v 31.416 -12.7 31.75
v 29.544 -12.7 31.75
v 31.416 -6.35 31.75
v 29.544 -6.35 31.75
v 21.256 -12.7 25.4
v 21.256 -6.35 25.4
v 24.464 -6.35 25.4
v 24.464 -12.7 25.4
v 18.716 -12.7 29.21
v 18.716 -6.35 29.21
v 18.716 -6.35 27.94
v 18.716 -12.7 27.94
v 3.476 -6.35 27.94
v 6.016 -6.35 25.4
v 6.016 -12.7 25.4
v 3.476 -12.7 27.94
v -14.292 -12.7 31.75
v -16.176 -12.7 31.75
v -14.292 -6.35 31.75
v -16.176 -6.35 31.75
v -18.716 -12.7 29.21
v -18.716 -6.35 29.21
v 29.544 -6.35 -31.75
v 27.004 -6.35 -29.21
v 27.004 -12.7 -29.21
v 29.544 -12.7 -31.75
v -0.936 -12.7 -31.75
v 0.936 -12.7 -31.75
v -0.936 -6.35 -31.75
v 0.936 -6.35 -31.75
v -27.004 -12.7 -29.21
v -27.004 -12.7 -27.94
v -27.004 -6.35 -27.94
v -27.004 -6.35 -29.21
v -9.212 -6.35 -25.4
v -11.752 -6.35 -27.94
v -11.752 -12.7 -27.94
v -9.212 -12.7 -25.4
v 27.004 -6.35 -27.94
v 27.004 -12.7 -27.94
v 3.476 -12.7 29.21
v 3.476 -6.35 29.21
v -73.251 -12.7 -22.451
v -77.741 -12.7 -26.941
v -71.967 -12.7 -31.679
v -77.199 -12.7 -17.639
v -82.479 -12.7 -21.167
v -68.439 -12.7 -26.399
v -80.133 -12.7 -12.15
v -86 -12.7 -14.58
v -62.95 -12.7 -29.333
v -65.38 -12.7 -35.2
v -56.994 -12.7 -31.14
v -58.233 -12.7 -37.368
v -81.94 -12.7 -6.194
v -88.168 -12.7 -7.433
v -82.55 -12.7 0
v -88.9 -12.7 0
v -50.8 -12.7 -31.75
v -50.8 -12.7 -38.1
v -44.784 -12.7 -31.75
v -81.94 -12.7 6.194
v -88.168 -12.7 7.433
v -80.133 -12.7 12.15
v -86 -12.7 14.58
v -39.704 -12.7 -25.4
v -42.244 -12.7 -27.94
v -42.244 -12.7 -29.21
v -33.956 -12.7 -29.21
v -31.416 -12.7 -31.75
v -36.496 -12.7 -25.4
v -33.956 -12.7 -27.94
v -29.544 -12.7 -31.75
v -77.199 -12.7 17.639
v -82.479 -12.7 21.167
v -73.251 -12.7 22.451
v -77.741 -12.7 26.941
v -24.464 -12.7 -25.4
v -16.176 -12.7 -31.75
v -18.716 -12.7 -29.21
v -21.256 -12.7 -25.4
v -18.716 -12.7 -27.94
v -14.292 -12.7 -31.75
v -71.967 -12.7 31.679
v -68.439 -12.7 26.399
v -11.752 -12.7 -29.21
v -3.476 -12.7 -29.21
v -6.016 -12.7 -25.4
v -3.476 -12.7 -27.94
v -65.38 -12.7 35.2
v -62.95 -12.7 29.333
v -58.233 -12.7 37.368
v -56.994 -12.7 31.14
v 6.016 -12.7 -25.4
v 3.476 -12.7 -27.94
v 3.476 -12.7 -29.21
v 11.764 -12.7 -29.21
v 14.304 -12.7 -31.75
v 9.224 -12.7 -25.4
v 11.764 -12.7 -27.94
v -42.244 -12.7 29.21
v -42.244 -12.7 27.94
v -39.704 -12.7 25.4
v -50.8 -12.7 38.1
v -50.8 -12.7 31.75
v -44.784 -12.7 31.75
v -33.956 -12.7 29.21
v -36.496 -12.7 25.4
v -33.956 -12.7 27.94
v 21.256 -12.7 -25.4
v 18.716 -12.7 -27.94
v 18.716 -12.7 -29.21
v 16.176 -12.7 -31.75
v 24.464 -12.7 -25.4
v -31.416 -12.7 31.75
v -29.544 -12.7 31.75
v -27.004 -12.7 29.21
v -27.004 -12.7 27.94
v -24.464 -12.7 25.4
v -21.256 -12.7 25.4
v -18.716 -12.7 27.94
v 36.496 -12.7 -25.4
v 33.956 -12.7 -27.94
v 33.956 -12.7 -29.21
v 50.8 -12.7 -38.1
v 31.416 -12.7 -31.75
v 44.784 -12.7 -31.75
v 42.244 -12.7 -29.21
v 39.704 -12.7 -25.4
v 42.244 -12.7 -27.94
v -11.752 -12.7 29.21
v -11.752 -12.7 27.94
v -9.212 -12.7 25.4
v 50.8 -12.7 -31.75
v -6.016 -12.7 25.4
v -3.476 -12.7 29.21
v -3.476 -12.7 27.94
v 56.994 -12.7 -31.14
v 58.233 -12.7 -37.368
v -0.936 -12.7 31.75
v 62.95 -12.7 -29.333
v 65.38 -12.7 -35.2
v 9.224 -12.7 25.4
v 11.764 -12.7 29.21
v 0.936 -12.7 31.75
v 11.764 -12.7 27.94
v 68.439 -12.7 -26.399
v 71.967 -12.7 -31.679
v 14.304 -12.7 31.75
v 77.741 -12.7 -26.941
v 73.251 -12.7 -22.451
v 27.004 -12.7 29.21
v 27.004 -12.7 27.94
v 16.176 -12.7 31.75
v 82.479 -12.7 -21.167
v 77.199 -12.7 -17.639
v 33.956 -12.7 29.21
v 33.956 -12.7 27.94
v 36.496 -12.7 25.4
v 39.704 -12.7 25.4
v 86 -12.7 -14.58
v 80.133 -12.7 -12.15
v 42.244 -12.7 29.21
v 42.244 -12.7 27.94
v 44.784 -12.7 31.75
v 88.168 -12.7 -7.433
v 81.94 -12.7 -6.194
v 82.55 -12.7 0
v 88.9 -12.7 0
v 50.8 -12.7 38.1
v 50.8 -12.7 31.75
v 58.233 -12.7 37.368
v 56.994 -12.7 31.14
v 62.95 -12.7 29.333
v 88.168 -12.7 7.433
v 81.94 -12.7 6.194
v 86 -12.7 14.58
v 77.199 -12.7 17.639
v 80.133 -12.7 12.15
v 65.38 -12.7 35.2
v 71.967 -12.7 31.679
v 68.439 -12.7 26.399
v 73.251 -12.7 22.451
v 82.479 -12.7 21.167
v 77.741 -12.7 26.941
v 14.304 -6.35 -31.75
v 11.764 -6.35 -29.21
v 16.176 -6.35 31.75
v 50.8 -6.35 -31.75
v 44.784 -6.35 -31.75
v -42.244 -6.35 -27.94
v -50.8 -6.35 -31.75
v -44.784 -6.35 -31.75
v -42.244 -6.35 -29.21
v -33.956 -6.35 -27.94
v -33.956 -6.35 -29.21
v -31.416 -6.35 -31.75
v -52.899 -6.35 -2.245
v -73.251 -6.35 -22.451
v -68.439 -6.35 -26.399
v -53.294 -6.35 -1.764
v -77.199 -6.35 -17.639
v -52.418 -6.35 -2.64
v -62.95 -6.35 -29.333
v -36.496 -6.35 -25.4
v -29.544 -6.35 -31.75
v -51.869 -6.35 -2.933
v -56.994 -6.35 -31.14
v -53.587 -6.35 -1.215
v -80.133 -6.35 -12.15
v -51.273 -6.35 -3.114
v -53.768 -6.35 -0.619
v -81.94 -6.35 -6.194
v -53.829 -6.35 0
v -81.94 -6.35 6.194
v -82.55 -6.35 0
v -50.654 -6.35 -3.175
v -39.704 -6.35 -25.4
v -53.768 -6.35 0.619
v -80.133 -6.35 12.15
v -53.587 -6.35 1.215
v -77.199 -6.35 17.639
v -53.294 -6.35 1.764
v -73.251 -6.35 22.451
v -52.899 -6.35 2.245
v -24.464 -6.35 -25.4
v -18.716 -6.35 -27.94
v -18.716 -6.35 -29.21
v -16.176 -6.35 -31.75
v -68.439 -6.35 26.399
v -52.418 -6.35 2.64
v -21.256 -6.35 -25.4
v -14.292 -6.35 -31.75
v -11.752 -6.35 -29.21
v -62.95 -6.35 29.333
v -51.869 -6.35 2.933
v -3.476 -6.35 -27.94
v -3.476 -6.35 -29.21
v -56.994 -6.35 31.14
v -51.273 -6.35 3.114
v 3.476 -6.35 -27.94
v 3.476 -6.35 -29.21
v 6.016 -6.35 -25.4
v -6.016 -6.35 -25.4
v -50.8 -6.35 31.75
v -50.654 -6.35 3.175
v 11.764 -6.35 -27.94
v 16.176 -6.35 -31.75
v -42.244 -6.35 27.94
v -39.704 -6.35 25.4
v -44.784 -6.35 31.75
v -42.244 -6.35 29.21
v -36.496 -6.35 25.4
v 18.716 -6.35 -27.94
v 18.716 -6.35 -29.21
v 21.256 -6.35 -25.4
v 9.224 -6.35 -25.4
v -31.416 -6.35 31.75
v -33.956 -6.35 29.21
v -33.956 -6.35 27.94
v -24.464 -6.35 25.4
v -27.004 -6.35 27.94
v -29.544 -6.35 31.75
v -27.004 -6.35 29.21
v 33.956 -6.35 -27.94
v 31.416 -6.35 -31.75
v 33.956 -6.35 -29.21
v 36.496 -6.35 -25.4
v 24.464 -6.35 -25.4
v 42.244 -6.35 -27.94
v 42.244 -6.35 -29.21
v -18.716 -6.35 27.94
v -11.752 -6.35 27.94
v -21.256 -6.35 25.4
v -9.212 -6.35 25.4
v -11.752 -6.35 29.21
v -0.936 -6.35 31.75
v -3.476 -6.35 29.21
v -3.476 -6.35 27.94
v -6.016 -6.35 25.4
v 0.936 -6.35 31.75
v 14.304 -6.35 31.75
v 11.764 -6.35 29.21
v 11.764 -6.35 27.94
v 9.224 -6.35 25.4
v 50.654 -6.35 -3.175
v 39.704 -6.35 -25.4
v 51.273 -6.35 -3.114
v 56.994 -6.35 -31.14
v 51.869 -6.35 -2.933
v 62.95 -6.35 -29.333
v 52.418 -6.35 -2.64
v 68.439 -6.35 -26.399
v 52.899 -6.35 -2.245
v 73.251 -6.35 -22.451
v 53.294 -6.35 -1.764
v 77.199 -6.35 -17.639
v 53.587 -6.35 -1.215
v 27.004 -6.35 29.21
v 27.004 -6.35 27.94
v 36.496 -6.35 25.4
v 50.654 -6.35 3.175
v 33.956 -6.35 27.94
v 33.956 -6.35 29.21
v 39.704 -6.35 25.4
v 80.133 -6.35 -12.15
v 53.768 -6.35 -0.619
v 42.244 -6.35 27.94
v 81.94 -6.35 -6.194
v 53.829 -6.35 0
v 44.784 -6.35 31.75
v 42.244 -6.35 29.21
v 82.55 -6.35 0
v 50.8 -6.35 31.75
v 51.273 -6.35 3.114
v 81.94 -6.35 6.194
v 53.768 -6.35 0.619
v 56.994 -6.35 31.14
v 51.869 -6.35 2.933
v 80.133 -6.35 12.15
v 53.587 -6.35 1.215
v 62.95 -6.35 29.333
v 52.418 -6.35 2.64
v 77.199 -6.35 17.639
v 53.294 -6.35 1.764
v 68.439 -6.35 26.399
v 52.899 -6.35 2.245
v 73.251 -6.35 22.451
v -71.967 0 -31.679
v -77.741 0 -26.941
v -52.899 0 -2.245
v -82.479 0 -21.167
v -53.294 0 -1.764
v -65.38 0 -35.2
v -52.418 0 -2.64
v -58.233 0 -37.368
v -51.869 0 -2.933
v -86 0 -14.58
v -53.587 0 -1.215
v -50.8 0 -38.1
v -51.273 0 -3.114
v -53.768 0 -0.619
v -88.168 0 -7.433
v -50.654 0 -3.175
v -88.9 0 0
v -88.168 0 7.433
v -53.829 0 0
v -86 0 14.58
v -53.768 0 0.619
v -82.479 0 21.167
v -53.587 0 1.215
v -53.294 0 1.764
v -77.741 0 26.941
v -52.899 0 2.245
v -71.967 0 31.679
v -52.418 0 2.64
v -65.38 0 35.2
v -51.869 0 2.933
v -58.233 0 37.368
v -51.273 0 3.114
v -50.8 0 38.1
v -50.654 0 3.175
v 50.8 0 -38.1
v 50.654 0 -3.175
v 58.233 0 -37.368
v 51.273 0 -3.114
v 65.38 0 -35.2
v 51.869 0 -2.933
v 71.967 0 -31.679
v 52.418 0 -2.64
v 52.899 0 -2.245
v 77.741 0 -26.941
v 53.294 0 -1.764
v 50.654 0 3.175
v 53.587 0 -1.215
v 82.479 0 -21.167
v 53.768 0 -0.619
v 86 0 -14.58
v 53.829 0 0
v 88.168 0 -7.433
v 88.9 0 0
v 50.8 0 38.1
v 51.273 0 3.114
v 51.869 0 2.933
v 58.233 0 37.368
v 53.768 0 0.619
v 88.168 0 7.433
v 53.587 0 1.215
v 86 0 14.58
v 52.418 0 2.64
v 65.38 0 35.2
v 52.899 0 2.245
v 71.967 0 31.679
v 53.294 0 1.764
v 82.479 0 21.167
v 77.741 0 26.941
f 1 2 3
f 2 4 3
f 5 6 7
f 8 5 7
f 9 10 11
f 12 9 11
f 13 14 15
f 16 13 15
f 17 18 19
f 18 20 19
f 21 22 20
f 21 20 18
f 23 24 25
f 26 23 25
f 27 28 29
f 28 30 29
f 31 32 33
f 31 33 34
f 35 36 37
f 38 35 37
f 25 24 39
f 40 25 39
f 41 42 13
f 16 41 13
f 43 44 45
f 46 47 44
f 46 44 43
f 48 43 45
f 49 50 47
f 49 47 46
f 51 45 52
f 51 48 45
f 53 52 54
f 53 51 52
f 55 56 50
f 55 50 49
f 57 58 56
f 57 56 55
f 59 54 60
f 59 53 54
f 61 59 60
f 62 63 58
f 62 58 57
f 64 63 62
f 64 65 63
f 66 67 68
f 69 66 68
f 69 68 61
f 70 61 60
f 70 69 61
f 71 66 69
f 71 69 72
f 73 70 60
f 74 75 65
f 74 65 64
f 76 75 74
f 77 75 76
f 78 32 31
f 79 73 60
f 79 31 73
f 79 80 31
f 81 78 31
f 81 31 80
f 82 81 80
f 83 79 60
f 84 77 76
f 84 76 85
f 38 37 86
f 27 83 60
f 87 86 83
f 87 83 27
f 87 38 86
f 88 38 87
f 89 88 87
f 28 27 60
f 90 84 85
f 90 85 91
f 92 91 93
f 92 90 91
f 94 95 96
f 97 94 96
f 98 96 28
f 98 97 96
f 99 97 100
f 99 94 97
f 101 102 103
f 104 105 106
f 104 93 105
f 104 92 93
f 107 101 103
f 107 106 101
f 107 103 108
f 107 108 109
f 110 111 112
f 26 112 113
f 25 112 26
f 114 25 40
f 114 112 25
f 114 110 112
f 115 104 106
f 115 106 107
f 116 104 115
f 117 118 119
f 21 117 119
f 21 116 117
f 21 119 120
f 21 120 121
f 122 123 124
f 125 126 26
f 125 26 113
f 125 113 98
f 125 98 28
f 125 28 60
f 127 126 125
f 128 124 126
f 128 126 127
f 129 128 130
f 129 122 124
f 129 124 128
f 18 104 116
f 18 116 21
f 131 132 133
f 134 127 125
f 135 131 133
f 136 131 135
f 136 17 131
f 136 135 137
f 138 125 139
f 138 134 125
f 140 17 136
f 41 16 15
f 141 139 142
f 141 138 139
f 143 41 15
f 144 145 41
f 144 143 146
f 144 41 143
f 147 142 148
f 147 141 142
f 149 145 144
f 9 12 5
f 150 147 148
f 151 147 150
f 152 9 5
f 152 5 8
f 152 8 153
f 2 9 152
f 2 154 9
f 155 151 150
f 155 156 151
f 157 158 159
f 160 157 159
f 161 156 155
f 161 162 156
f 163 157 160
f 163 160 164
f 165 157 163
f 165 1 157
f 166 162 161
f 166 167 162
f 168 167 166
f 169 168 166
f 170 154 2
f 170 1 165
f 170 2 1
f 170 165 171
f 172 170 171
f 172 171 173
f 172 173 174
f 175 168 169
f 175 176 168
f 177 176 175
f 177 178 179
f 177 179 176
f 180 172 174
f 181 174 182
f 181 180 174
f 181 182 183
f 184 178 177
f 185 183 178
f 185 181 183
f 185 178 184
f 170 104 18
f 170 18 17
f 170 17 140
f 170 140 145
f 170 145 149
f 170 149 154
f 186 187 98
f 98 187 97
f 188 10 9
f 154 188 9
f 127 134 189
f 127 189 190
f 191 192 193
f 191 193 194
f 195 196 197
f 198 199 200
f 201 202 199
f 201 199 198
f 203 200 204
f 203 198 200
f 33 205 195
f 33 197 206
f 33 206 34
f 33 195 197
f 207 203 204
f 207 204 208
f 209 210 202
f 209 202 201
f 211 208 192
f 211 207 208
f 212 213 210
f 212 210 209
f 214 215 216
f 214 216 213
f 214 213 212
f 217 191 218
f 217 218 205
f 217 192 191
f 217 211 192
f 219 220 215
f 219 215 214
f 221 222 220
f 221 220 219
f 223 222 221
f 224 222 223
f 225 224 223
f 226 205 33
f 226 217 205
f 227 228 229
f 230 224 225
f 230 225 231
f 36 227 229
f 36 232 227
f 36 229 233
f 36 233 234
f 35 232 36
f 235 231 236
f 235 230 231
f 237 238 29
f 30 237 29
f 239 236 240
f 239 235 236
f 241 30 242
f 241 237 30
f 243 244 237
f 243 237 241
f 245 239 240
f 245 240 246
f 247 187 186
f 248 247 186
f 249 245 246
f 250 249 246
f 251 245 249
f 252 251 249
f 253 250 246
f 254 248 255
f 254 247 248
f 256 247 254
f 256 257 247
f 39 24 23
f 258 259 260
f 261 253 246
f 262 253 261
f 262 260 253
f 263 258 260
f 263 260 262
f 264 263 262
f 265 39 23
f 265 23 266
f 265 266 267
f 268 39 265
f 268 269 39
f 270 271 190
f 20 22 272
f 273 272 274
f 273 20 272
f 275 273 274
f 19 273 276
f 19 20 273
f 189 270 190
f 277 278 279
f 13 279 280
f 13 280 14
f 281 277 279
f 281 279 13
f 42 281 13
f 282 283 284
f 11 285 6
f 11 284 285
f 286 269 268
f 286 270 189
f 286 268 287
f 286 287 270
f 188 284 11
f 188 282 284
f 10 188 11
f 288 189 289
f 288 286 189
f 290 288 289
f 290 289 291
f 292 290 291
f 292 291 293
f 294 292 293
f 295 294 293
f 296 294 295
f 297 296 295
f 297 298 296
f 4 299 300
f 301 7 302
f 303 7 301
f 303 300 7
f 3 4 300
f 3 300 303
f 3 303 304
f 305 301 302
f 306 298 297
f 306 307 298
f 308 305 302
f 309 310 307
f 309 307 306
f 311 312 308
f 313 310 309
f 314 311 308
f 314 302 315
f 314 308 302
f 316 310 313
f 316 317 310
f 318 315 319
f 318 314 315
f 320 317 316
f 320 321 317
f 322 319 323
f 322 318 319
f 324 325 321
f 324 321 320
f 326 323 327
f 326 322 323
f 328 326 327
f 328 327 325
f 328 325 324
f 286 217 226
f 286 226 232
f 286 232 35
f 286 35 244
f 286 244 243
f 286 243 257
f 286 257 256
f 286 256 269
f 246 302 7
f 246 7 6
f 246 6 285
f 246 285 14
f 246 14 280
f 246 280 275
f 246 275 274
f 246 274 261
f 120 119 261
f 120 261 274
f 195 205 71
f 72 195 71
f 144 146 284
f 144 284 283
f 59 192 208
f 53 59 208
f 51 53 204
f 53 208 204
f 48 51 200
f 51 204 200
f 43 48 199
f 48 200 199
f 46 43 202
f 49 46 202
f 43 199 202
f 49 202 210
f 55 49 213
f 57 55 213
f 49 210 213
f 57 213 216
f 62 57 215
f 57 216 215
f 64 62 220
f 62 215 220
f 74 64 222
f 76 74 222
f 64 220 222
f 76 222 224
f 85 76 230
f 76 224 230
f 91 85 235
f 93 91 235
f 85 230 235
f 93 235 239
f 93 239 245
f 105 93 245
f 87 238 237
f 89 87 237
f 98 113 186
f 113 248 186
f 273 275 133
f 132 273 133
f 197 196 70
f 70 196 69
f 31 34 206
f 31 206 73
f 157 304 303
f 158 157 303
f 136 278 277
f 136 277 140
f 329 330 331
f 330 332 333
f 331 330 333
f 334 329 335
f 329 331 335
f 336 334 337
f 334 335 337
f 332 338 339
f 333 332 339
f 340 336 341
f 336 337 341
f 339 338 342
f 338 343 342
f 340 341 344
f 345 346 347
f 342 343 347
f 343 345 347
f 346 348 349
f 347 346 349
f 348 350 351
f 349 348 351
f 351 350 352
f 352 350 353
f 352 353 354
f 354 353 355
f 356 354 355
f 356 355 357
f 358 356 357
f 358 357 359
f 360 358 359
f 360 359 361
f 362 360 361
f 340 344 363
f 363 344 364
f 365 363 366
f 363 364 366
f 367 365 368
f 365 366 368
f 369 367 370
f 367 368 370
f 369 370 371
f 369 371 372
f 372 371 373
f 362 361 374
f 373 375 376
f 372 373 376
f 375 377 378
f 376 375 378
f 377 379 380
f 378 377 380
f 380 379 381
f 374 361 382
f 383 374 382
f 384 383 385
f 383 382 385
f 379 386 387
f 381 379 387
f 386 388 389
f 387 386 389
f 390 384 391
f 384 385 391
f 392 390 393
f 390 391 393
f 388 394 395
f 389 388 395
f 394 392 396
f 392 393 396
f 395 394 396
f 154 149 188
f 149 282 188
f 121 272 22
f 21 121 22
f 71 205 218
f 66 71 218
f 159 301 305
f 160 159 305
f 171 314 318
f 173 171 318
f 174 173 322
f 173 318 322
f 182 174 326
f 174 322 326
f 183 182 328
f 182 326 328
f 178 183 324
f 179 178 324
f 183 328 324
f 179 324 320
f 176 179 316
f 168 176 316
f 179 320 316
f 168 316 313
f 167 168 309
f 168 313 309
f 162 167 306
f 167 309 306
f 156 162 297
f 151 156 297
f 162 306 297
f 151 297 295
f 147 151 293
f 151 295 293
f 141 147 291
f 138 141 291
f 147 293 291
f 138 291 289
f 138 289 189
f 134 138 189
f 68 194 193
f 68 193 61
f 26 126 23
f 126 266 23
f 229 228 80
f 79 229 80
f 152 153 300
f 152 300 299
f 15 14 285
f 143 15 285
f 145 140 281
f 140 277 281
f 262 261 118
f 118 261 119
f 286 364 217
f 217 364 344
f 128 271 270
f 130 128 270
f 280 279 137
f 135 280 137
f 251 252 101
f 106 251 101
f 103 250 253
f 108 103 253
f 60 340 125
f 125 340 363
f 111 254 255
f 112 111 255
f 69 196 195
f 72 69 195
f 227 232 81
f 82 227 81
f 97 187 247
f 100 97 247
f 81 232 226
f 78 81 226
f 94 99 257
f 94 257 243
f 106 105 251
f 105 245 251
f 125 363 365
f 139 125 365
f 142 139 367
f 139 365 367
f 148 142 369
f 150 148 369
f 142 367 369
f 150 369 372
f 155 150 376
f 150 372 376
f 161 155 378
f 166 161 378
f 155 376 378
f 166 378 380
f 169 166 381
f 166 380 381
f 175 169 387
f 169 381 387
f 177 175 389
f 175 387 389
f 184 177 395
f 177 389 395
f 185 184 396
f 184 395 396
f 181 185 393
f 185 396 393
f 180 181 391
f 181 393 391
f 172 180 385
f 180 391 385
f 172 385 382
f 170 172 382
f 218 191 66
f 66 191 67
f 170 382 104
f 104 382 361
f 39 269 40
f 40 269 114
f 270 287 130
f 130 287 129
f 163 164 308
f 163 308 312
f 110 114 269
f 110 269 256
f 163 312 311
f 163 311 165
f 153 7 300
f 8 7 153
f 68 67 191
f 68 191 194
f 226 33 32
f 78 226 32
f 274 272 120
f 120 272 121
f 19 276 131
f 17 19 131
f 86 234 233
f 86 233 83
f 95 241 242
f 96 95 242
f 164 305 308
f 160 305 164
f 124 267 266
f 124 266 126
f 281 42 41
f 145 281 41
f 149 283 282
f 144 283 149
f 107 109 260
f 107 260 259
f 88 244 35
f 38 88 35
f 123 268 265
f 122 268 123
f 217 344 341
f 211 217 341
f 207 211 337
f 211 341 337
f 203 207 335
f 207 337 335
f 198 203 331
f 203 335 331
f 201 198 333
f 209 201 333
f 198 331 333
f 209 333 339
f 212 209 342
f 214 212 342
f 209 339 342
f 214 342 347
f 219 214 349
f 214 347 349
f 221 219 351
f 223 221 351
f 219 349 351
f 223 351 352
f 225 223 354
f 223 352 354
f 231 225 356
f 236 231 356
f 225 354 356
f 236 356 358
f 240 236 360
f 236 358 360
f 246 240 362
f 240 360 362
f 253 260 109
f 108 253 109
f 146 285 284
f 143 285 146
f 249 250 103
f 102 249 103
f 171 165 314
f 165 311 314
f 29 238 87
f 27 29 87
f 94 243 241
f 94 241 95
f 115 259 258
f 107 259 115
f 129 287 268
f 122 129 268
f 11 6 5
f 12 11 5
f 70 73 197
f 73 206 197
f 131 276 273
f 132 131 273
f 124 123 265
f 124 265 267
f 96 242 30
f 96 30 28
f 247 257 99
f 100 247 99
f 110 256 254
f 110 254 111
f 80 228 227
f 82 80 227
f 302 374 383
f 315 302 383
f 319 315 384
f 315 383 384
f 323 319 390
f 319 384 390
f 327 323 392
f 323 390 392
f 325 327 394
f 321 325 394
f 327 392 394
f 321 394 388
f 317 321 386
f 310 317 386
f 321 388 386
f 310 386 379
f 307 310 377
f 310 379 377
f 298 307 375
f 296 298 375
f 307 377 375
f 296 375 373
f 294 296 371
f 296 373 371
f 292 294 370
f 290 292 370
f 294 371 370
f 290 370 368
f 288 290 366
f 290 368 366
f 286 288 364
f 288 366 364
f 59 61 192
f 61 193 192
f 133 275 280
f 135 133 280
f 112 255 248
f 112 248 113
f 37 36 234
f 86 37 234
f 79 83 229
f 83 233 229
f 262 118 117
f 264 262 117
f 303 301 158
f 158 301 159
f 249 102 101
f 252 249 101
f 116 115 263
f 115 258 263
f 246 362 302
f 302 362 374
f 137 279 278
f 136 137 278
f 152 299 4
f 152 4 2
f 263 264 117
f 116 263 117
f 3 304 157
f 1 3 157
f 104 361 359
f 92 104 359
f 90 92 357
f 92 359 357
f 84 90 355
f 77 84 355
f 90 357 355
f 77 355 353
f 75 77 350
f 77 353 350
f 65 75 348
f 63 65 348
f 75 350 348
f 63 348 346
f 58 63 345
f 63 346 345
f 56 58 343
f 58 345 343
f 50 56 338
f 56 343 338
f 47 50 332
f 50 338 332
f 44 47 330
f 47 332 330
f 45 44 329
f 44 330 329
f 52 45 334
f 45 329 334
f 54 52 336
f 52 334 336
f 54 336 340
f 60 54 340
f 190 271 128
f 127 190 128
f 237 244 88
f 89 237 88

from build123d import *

# Parameters (mm, degrees)
F1_DEPTH = 6.35
F2_DEPTH = 12.7
F4_DEPTH = 6.35
F5_SIZE  = 2.54
F3_W     = 8.288401
F3_H     = 6.35
F6_DEPTH = 6.35
F7_SIZE  = 2.54


with BuildPart() as f1:
    # F0 (on Front) → F1 (new body)
    with BuildSketch(Plane.XZ):
        with BuildLine():
            Line((50.8, 31.75), (-50.8, 31.75))
            ThreePointArc((-50.8, 31.75), (-82.55, 0), (-50.8, -31.75))
            Line((-50.8, -31.75), (50.8, -31.75))
            ThreePointArc((50.8, -31.75), (82.55, 0), (50.8, 31.75))
        make_face()
        with BuildLine():
            ThreePointArc((-50.6538152695, -3.175), (-53.8288152695, 0), (-50.6538152695, 3.175))
            Line((-50.6538152695, 3.175), (50.6538152695, 3.175))
            ThreePointArc((50.6538152695, 3.175), (53.8288152695, 0), (50.6538152695, -3.175))
            Line((50.6538152695, -3.175), (-50.6538152695, -3.175))
        make_face(mode=Mode.SUBTRACT)
    extrude(amount=F1_DEPTH)

    # F0 (on Front) → F2 (join)
    with BuildSketch(Plane.XZ):
        with BuildLine():
            Line((50.8, 38.1), (-50.8, 38.1))
            ThreePointArc((-50.8, 38.1), (-88.9, 0), (-50.8, -38.1))
            Line((-50.8, -38.1), (50.8, -38.1))
            ThreePointArc((50.8, -38.1), (88.9, 0), (50.8, 38.1))
        make_face()
        with BuildLine():
            ThreePointArc((-50.8, -31.75), (-82.55, 0), (-50.8, 31.75))
            Line((-50.8, 31.75), (50.8, 31.75))
            ThreePointArc((50.8, 31.75), (82.55, 0), (50.8, -31.75))
            Line((50.8, -31.75), (-50.8, -31.75))
        make_face(mode=Mode.SUBTRACT)
    extrude(amount=F2_DEPTH)

    # F3 (on face) → F4 (join)
    with BuildSketch(Plane.XZ.offset(6.35)):
        Polygon((-38.1, -31.75), (-33.9557995, -31.75), (-33.9557995, -25.4), (-38.1, -25.4), (-42.2442005, -25.4), (-42.2442005, -31.75), align=None)
        Polygon((-27.0042005, -31.75), (-18.7157995, -31.75), (-18.7157995, -25.4), (-22.86, -25.4), (-27.0042005, -25.4), align=None)
        Polygon((-11.7515005, -31.75), (-3.4757995, -31.75), (-3.4757995, -25.4), (-7.62, -25.4), (-11.7515005, -25.4), align=None)
        Polygon((3.4757995, -25.4), (3.4757995, -31.75), (11.7642005, -31.75), (11.7642005, -25.4), (7.62, -25.4), align=None)
        Polygon((18.7157995, -25.4), (18.7157995, -31.75), (27.0042005, -31.75), (27.0042005, -25.4), (22.86, -25.4), align=None)
        Polygon((33.9557995, -25.4), (33.9557995, -31.75), (38.1, -31.75), (42.2442005, -31.75), (42.2442005, -25.4), (38.1, -25.4), align=None)
    extrude(amount=F4_DEPTH)

    # F5
    f5_edges = [f1.edges().sort_by_distance(p)[0] for p in [
        (-42.244201, -9.525, -25.4),
        (-33.9558, -9.525, -25.4),
        (-27.004201, -9.525, -25.4),
        (-18.7158, -9.525, -25.4),
        (-11.751501, -9.525, -25.4),
        (-3.4758, -9.525, -25.4),
        (3.475799, -9.525, -25.4),
        (11.7642, -9.525, -25.4),
        (18.715799, -9.525, -25.4),
        (27.0042, -9.525, -25.4),
        (33.9558, -9.525, -25.4),
        (42.244201, -9.525, -25.4),
        (33.9558, -9.525, -31.75),
        (42.244201, -9.525, -31.75),
        (27.0042, -9.525, -31.75),
        (11.7642, -9.525, -31.75),
        (18.715799, -9.525, -31.75),
        (3.475799, -9.525, -31.75),
        (-11.751501, -9.525, -31.75),
        (-27.004201, -9.525, -31.75),
        (-3.4758, -9.525, -31.75),
        (-18.7158, -9.525, -31.75),
        (-33.9558, -9.525, -31.75),
        (-42.244201, -9.525, -31.75),
    ]]
    chamfer(f5_edges, length=F5_SIZE)

    # F3 (on face) → F6 (join)
    with BuildSketch(Plane.XZ.offset(6.35)):
        with Locations((-38.1, 28.575)):
            Rectangle(F3_W, F3_H)
        with Locations((-22.86, 28.575)):
            Rectangle(F3_W, F3_H)
        Polygon((-3.4757995, 31.75), (-11.7515005, 31.75), (-11.7515005, 25.4), (-7.62, 25.4), (-3.4757995, 25.4), align=None)
        Polygon((11.7642005, 25.4), (11.7642005, 31.75), (3.4757995, 31.75), (3.4757995, 25.4), (7.62, 25.4), align=None)
        Polygon((27.0042005, 25.4), (27.0042005, 31.75), (18.7157995, 31.75), (18.7157995, 25.4), (22.86, 25.4), align=None)
        Polygon((42.2442005, 25.4), (42.2442005, 31.75), (33.9557995, 31.75), (33.9557995, 25.4), (38.1, 25.4), align=None)
    extrude(amount=F6_DEPTH)

    # F7
    f7_edges = [f1.edges().sort_by_distance(p)[0] for p in [
        (-42.244201, -9.525, 31.75),
        (-27.004201, -9.525, 31.75),
        (-42.244201, -9.525, 25.4),
        (-33.9558, -9.525, 25.4),
        (-33.955799, -9.525, 31.75),
        (-27.004201, -9.525, 25.4),
        (-18.7158, -9.525, 25.4),
        (-18.7158, -9.525, 31.75),
        (-11.751501, -9.525, 25.4),
        (-11.7515, -9.525, 31.75),
        (-3.4758, -9.525, 25.4),
        (3.475799, -9.525, 25.4),
        (11.7642, -9.525, 25.4),
        (18.715799, -9.525, 25.4),
        (27.0042, -9.525, 25.4),
        (33.9558, -9.525, 25.4),
        (42.244201, -9.525, 25.4),
        (42.244201, -9.525, 31.75),
        (27.0042, -9.525, 31.75),
        (11.764201, -9.525, 31.75),
        (18.7158, -9.525, 31.75),
        (33.9558, -9.525, 31.75),
        (-3.4758, -9.525, 31.75),
        (3.475799, -9.525, 31.75),
    ]]
    chamfer(f7_edges, length=F7_SIZE)


solid = f1.part
